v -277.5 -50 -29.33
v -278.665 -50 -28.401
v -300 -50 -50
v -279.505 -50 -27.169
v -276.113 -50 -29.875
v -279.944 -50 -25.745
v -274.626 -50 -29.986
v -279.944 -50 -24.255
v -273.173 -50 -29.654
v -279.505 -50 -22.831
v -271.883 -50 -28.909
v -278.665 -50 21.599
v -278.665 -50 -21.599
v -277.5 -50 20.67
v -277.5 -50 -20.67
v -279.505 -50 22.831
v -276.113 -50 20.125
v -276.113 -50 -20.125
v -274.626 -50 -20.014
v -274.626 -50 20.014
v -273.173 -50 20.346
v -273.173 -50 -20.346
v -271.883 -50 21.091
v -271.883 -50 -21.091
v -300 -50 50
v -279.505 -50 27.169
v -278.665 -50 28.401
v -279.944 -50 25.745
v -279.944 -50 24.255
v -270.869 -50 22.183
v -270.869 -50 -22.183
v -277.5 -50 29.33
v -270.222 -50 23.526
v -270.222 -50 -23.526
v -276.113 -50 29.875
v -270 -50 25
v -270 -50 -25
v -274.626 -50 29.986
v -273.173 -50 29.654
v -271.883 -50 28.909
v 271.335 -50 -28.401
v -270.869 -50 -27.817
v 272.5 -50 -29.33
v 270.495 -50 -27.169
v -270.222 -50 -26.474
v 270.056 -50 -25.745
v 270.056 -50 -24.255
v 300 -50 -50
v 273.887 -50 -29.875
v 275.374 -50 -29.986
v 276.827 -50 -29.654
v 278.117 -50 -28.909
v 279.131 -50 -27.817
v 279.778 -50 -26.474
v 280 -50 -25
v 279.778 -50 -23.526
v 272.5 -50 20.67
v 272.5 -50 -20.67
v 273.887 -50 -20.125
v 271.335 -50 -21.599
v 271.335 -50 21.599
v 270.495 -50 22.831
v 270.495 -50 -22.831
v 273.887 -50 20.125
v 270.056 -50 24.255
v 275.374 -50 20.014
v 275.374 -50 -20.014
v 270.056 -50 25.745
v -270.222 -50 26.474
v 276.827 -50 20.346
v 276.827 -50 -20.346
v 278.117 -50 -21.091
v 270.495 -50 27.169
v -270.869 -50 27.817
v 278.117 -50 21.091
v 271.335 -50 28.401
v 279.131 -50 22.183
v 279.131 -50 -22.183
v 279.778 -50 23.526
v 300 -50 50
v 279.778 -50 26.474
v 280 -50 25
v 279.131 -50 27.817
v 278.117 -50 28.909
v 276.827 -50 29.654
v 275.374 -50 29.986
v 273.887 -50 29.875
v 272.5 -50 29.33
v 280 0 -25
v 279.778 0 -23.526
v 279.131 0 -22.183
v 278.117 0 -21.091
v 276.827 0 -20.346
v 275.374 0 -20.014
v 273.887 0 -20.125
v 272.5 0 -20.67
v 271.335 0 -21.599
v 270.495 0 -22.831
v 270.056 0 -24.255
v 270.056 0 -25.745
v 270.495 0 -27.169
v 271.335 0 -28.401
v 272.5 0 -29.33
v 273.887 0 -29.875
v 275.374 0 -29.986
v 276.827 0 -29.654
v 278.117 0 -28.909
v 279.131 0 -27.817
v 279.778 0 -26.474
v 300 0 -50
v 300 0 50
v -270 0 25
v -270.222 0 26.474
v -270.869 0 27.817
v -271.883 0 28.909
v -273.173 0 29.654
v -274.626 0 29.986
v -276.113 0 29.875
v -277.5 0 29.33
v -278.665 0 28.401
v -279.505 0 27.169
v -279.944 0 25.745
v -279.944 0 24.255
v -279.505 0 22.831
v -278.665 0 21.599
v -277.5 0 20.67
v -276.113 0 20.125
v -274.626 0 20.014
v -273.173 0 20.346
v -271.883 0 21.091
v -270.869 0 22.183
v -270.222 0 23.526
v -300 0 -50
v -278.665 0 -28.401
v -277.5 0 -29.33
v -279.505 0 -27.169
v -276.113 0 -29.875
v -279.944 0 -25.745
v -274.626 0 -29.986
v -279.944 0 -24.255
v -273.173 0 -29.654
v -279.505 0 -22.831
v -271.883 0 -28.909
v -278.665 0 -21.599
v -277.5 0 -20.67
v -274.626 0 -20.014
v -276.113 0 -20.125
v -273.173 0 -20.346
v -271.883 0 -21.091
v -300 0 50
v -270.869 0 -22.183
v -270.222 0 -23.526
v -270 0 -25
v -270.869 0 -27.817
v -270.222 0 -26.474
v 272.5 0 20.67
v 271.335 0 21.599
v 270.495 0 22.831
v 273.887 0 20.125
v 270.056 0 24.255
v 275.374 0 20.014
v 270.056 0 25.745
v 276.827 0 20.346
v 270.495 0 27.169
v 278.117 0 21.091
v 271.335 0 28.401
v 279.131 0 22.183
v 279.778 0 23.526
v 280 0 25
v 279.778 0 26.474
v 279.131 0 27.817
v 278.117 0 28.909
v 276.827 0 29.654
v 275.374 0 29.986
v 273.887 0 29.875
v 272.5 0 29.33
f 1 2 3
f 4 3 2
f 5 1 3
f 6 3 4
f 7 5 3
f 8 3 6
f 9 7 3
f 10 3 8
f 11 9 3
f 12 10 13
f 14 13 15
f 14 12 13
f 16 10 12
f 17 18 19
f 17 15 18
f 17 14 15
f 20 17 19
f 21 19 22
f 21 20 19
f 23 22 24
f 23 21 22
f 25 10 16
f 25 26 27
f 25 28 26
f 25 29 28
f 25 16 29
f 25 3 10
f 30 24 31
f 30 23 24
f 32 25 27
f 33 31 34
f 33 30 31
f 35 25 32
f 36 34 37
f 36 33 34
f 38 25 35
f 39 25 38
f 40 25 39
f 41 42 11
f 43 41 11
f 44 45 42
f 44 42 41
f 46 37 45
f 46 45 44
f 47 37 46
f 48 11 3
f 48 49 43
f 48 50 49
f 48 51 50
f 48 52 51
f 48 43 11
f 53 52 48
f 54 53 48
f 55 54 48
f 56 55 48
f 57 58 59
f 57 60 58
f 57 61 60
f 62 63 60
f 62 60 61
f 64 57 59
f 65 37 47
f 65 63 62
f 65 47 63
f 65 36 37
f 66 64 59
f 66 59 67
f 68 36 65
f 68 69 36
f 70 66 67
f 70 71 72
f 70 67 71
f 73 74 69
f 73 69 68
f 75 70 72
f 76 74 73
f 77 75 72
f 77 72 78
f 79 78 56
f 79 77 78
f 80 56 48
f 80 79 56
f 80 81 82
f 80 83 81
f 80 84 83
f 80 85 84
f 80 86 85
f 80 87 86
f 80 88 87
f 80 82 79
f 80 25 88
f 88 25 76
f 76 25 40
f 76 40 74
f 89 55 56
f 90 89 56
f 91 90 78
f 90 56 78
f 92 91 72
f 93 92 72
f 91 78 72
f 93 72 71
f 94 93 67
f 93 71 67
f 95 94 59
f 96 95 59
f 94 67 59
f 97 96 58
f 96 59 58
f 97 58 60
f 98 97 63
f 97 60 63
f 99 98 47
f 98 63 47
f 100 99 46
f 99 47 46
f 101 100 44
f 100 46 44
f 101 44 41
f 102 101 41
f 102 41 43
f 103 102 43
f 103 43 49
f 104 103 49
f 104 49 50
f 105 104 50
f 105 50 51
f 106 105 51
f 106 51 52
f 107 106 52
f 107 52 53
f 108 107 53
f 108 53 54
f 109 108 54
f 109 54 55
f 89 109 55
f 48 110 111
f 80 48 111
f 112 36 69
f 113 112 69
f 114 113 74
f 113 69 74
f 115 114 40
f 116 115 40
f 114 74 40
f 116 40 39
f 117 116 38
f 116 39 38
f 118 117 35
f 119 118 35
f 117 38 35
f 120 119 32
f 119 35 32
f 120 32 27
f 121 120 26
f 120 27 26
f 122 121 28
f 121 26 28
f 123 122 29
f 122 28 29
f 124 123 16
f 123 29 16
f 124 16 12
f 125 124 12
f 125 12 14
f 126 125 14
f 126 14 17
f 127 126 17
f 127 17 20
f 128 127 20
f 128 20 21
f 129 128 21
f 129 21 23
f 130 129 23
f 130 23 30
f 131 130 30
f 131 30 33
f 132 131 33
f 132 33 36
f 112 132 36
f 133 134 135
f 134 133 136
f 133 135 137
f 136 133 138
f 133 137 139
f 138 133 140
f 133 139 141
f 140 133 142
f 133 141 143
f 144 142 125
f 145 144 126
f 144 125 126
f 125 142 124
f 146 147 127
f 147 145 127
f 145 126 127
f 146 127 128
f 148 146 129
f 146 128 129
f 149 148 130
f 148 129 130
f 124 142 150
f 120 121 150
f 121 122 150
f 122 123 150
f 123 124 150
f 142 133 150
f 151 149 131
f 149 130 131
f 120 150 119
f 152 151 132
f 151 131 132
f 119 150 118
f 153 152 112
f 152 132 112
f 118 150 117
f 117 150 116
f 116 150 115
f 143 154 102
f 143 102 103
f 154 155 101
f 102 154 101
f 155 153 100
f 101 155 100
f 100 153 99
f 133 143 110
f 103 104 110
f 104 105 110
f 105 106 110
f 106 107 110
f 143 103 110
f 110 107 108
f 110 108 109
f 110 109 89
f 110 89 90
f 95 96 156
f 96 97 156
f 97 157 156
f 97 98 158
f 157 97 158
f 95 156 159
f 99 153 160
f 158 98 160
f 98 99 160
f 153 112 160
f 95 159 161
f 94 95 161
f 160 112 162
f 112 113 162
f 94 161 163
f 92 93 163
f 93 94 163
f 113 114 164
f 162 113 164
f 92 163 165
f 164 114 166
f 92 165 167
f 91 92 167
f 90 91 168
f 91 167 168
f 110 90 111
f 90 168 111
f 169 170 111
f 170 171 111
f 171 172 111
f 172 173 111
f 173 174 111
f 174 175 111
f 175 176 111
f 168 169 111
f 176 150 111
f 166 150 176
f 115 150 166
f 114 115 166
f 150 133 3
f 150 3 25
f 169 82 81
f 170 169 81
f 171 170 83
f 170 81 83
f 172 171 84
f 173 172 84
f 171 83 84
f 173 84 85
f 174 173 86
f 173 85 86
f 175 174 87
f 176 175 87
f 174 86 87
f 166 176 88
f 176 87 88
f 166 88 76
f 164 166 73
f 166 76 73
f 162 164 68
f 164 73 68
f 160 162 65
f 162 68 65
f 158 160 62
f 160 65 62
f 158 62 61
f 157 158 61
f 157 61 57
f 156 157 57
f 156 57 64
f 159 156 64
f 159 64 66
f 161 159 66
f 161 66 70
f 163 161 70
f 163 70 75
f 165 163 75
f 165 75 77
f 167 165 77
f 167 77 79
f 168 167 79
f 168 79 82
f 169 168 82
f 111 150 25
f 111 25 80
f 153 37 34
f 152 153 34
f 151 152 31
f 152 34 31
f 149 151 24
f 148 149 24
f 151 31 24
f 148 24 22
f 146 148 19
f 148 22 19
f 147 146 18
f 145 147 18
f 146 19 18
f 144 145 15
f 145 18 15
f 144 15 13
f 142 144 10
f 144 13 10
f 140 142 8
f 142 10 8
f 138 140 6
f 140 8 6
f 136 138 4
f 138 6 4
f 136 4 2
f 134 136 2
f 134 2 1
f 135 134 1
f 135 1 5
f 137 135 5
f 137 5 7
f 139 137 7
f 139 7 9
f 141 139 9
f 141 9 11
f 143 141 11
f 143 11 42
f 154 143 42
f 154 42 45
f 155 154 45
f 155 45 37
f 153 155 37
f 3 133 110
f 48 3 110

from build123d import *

# Parameters (mm, degrees)
F0_W     = 600
F0_H     = 100
F1_DEPTH = 50
F2_R     = 5
F3_DEPTH = 50.001


with BuildPart() as f1:
    # F0 (on Front) → F1 (new body)
    with BuildSketch(Plane.XZ):
        Rectangle(F0_W, F0_H)
    extrude(amount=F1_DEPTH)

    # F2 (on face) → F3 (cut, through all)
    with BuildSketch(Plane.XZ.offset(50)):
        with Locations((-275, 25)):
            Circle(F2_R)
        with Locations((-275, -25)):
            Circle(F2_R)
        with Locations((275, 25)):
            Circle(F2_R)
        with Locations((275, -25)):
            Circle(F2_R)
    extrude(amount=-F3_DEPTH, mode=Mode.SUBTRACT)


solid = f1.part
